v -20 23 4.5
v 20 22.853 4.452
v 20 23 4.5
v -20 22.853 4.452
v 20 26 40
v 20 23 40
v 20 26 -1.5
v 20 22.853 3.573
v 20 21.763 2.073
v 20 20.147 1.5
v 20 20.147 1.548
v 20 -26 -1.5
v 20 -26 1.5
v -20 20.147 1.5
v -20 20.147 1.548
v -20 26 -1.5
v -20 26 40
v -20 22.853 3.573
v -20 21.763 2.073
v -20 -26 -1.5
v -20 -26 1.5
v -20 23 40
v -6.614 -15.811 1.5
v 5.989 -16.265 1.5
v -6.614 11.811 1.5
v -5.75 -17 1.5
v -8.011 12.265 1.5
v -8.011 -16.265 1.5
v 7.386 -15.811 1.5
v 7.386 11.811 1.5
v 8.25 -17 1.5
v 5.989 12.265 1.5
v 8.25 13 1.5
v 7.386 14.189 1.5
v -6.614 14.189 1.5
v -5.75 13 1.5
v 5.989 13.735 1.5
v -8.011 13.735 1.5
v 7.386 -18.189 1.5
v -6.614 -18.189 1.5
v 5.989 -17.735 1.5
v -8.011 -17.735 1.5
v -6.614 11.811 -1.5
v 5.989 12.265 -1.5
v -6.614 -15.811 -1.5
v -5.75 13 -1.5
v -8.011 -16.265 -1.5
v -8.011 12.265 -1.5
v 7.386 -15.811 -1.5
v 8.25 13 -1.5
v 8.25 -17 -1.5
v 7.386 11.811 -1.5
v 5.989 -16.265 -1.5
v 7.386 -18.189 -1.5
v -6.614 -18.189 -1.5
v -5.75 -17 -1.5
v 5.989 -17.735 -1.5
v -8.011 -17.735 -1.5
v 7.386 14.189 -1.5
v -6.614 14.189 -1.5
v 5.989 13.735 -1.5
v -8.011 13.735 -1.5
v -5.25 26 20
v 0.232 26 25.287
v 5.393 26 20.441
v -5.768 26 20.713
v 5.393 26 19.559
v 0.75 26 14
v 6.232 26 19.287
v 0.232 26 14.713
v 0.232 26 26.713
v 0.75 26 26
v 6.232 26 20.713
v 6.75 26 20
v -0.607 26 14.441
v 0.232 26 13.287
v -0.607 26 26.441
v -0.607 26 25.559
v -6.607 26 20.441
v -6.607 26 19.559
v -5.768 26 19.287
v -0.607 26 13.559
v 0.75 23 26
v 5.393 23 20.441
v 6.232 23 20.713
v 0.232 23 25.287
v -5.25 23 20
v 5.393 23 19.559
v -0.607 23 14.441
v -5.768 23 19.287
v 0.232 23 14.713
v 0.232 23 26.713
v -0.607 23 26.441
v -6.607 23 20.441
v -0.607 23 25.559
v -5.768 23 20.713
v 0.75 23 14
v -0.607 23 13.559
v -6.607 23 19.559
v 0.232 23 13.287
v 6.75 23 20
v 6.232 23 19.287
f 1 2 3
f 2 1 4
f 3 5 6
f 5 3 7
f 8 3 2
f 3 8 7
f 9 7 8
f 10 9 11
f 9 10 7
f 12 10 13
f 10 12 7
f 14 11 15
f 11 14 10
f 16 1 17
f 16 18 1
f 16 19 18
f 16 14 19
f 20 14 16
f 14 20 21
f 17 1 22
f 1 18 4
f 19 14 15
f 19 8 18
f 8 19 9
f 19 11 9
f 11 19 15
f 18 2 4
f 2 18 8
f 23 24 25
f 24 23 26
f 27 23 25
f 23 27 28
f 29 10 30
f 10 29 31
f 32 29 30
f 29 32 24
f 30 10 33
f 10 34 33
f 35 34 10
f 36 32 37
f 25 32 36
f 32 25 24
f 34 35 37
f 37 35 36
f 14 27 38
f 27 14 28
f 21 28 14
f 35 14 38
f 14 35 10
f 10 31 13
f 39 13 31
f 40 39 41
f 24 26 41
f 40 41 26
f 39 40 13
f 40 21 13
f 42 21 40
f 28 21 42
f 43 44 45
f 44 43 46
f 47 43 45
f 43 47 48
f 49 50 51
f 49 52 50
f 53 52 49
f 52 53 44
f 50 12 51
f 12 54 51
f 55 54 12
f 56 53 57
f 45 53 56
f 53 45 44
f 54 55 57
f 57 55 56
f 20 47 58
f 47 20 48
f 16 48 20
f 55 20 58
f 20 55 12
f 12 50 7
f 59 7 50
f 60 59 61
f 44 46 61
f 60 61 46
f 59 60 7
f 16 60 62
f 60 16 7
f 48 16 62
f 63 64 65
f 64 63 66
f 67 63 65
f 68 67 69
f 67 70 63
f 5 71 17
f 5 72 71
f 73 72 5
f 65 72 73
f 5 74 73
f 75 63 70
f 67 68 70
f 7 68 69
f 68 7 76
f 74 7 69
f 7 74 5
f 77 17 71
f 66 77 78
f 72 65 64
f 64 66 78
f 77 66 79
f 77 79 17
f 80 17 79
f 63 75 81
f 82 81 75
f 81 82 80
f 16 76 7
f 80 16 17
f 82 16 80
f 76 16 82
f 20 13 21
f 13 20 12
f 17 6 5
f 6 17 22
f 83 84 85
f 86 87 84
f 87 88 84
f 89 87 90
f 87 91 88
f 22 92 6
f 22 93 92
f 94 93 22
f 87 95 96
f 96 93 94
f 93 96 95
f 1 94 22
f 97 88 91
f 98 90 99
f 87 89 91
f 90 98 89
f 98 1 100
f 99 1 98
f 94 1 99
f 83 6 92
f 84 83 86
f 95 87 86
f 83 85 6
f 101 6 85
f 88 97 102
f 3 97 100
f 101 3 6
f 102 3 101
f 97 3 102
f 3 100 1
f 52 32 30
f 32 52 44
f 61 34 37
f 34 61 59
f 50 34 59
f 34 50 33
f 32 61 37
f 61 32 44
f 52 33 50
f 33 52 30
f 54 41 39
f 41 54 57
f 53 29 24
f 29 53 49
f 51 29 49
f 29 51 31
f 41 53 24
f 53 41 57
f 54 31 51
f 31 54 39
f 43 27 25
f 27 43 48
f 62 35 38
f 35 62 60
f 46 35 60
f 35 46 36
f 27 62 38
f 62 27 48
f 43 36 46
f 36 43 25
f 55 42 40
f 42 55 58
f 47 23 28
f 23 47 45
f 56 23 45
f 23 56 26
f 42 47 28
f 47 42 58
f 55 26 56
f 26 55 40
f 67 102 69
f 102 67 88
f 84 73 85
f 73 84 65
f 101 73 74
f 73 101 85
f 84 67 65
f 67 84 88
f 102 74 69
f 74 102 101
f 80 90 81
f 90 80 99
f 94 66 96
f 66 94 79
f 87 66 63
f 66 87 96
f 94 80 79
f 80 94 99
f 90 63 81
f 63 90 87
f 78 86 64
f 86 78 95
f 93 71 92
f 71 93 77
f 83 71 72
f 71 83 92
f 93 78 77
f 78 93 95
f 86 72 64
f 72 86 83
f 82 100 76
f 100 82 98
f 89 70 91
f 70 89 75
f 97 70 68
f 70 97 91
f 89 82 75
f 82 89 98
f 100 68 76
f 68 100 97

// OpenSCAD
module MotorMountHoles(depth) {
  mount_width = 12;
  mount_height = 12;
  screw_type = 1.5;

  translate([mount_width / 2.0, 0.0]) {
    #cylinder(r=screw_type / 2.0, h=depth, center=true);
  }
  translate([-mount_width / 2.0, 0.0]) {
    #cylinder(r=screw_type / 2.0, h=depth, center=true);
  }

  translate([0.0, mount_height / 2.0]) {
    #cylinder(r=screw_type / 2.0, h=depth, center=true);
  }
  translate([0.0, -mount_height / 2.0]) {
    #cylinder(r=screw_type / 2.0, h=depth, center=true);
  }
}

module PointGreyMountHoles(depth) {
  mount_width = 30;
  mount_height = 14;
  screw_type = 2.5;

  translate([mount_height / 2.0, mount_width / 2.0]) {
    #cylinder(r=screw_type / 2.0, h=depth, center=true);
  }
  translate([mount_height / 2.0, -mount_width / 2.0]) {
    #cylinder(r=screw_type / 2.0, h=depth, center=true);
  }
  translate([-mount_height / 2.0, mount_width / 2.0]) {
    #cylinder(r=screw_type / 2.0, h=depth, center=true);
  }
  translate([-mount_height / 2.0, -mount_width / 2.0]) {
    #cylinder(r=screw_type / 2.0, h=depth, center=true);
  }
}

module GimbalBracket(width, length, depth) {
  cube([width, length, depth], center=true);
  translate([0.0, (length / 2.0) - depth / 2.0, width / 2.0]) {
    cube([width, depth, width], center=true);
  }

  // fillet
  translate([0, (length / 2.0) - depth, depth / 2.0]) {
      rotate([0, 90]) {
        difference() {
            cylinder(r=3, h=width, center=true);
            translate([-3.0, -3.0, 0.0]) {
              cylinder(r=3, h=width, center=true);
            }
        }
      }
  }
}

difference() {
  bracket_width = 40;
  bracket_length = 52;
  bracket_depth = 3;

  // gimbal bracket
  GimbalBracket(bracket_width, bracket_length, bracket_depth);

  // camera mount holes
  translate([0.0, -2.0, 0.0]) {
    PointGreyMountHoles(bracket_depth + 0.01);
  }

  // motor mount holes
  translate([0.0, (bracket_length / 2.0) - (bracket_depth / 2.0), 20]) {
    rotate([90.0, 0.0, 0.0]) {
      MotorMountHoles(bracket_depth + 0.01);
    }
  }
}
